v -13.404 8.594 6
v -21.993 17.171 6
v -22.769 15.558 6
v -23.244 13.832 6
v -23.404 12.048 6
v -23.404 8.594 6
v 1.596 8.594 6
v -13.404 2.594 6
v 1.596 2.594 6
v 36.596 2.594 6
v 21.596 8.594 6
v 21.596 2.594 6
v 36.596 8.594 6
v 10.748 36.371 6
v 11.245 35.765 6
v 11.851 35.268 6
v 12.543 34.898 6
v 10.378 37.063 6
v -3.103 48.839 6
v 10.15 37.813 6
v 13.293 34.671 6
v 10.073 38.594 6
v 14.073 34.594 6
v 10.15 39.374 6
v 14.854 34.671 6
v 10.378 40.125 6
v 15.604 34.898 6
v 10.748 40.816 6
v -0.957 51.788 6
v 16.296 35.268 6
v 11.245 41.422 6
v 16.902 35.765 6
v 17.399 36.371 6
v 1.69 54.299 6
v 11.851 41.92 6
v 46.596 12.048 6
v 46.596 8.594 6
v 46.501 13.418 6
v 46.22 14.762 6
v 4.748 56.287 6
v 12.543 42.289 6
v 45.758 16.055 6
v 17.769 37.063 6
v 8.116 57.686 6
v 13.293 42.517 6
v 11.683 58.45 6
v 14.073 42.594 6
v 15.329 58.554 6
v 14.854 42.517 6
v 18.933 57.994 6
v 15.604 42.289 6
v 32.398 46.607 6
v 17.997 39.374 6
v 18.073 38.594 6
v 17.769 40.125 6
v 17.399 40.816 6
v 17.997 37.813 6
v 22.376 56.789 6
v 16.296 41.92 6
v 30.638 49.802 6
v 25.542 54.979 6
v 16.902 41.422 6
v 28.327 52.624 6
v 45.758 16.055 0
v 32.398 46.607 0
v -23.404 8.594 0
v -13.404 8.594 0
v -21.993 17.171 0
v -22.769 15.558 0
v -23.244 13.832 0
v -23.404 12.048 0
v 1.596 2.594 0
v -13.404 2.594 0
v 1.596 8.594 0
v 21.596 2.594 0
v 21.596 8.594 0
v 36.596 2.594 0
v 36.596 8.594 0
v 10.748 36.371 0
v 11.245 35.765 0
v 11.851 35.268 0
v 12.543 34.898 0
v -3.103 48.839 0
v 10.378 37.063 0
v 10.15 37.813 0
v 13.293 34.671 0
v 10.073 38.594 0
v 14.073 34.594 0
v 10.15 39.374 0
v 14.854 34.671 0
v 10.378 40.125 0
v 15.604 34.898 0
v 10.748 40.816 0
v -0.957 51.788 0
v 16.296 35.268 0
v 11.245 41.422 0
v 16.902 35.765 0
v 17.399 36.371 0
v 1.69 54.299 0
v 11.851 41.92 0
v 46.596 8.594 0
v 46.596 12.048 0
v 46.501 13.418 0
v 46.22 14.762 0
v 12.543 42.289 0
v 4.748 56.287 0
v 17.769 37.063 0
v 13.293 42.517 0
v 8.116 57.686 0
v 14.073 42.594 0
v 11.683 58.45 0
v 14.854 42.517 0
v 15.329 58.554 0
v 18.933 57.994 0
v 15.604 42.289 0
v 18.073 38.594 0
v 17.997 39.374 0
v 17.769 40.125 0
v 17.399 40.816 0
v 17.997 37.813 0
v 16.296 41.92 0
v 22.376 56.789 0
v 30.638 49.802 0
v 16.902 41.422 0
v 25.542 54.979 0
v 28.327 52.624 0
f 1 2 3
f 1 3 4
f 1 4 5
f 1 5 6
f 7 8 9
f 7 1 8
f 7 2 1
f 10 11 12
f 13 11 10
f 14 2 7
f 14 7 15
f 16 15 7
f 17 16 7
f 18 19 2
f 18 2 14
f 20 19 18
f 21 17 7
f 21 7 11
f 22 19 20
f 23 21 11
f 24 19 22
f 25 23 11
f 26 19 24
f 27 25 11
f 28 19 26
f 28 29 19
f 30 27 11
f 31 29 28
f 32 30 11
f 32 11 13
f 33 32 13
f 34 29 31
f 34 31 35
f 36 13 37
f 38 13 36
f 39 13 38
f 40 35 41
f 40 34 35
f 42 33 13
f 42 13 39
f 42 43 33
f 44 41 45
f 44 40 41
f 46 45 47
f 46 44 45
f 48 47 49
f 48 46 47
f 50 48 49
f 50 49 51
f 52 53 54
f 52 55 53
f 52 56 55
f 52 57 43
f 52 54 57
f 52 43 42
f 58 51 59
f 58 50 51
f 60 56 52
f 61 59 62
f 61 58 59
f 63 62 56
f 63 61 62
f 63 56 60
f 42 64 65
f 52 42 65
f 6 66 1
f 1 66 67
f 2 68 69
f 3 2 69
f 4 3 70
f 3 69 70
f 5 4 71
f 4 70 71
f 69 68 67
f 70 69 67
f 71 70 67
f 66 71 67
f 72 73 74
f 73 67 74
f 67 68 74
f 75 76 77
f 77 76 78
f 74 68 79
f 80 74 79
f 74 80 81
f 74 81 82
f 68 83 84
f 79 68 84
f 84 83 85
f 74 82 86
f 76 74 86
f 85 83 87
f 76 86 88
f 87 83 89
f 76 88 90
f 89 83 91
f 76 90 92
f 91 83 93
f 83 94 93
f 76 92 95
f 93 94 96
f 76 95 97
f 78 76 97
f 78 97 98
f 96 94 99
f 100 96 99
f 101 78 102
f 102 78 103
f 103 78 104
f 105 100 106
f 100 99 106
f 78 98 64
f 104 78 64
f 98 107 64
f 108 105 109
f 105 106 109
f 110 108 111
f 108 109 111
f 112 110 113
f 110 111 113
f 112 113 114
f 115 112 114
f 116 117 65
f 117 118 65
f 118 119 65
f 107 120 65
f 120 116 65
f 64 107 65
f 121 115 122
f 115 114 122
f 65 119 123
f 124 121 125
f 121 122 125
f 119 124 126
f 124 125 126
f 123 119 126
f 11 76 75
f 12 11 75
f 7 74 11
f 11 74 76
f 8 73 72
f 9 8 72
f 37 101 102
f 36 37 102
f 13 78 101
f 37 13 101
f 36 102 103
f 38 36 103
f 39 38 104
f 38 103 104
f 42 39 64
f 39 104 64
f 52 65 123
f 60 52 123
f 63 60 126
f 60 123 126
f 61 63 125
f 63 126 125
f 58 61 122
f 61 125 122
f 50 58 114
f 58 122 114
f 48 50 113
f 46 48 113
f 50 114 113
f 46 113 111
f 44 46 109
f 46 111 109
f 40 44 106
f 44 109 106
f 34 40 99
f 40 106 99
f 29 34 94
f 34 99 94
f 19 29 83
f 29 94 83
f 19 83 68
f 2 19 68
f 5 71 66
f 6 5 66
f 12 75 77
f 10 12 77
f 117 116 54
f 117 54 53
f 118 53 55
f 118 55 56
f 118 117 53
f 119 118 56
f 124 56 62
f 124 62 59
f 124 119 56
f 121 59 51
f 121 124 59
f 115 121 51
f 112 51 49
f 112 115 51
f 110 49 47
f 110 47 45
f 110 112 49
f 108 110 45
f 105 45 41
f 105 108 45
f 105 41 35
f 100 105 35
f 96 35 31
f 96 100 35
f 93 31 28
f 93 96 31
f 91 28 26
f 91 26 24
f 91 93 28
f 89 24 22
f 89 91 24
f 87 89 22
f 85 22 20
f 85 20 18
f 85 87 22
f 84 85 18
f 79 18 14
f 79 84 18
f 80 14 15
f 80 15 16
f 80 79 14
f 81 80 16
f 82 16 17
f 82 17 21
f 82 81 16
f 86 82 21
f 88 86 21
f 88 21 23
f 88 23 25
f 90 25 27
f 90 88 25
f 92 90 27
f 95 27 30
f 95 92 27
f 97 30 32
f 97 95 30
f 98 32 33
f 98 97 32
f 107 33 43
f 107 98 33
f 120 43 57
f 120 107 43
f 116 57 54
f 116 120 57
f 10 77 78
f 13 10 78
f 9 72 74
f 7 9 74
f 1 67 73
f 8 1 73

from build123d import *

# Parameters (mm, degrees)
ESQUISSE1_R        = 4
BOSS_EXTRU_1_DEPTH = 6


with BuildPart() as part:
    # Esquisse1 → Boss.-Extru.1 (new body)
    with BuildSketch(Plane.XY):
        with BuildLine():
            Line((-13.404461185, 2.593779068), (1.595538815, 2.593779068))
            Line((1.595538815, 2.593779068), (1.595538815, 8.593779068))
            Line((1.595538815, 8.593779068), (21.595538815, 8.593779068))
            Line((21.595538815, 8.593779068), (21.595538815, 2.593779068))
            Line((21.595538815, 2.593779068), (36.595538815, 2.593779068))
            Line((36.595538815, 2.593779068), (36.595538815, 8.593779068))
            Line((36.595538815, 8.593779068), (46.595538815, 8.593779068))
            Line((46.595538815, 8.593779068), (46.595538815, 12.048496629))
            ThreePointArc((46.595538815, 12.048496629), (46.383875367, 14.095071218), (45.757845305, 16.0550088))
            Line((45.757845305, 16.0550088), (32.398093908, 46.60680341))
            ThreePointArc((32.398093908, 46.60680341), (15.328741232, 58.554348238), (-3.102903491, 48.839354618))
            Line((-3.102903491, 48.839354618), (-21.992653394, 17.171284404))
            ThreePointArc((-21.992653394, 17.171284404), (-23.045050433, 14.705381827), (-23.404461185, 12.048496629))
            Line((-23.404461185, 12.048496629), (-23.404461185, 8.593779068))
            Line((-23.404461185, 8.593779068), (-13.404461185, 8.593779068))
            Line((-13.404461185, 8.593779068), (-13.404461185, 2.593779068))
        make_face()
        with Locations((14.073480927, 38.593779068)):
            Circle(ESQUISSE1_R, mode=Mode.SUBTRACT)
    extrude(amount=BOSS_EXTRU_1_DEPTH)


solid = part.part
